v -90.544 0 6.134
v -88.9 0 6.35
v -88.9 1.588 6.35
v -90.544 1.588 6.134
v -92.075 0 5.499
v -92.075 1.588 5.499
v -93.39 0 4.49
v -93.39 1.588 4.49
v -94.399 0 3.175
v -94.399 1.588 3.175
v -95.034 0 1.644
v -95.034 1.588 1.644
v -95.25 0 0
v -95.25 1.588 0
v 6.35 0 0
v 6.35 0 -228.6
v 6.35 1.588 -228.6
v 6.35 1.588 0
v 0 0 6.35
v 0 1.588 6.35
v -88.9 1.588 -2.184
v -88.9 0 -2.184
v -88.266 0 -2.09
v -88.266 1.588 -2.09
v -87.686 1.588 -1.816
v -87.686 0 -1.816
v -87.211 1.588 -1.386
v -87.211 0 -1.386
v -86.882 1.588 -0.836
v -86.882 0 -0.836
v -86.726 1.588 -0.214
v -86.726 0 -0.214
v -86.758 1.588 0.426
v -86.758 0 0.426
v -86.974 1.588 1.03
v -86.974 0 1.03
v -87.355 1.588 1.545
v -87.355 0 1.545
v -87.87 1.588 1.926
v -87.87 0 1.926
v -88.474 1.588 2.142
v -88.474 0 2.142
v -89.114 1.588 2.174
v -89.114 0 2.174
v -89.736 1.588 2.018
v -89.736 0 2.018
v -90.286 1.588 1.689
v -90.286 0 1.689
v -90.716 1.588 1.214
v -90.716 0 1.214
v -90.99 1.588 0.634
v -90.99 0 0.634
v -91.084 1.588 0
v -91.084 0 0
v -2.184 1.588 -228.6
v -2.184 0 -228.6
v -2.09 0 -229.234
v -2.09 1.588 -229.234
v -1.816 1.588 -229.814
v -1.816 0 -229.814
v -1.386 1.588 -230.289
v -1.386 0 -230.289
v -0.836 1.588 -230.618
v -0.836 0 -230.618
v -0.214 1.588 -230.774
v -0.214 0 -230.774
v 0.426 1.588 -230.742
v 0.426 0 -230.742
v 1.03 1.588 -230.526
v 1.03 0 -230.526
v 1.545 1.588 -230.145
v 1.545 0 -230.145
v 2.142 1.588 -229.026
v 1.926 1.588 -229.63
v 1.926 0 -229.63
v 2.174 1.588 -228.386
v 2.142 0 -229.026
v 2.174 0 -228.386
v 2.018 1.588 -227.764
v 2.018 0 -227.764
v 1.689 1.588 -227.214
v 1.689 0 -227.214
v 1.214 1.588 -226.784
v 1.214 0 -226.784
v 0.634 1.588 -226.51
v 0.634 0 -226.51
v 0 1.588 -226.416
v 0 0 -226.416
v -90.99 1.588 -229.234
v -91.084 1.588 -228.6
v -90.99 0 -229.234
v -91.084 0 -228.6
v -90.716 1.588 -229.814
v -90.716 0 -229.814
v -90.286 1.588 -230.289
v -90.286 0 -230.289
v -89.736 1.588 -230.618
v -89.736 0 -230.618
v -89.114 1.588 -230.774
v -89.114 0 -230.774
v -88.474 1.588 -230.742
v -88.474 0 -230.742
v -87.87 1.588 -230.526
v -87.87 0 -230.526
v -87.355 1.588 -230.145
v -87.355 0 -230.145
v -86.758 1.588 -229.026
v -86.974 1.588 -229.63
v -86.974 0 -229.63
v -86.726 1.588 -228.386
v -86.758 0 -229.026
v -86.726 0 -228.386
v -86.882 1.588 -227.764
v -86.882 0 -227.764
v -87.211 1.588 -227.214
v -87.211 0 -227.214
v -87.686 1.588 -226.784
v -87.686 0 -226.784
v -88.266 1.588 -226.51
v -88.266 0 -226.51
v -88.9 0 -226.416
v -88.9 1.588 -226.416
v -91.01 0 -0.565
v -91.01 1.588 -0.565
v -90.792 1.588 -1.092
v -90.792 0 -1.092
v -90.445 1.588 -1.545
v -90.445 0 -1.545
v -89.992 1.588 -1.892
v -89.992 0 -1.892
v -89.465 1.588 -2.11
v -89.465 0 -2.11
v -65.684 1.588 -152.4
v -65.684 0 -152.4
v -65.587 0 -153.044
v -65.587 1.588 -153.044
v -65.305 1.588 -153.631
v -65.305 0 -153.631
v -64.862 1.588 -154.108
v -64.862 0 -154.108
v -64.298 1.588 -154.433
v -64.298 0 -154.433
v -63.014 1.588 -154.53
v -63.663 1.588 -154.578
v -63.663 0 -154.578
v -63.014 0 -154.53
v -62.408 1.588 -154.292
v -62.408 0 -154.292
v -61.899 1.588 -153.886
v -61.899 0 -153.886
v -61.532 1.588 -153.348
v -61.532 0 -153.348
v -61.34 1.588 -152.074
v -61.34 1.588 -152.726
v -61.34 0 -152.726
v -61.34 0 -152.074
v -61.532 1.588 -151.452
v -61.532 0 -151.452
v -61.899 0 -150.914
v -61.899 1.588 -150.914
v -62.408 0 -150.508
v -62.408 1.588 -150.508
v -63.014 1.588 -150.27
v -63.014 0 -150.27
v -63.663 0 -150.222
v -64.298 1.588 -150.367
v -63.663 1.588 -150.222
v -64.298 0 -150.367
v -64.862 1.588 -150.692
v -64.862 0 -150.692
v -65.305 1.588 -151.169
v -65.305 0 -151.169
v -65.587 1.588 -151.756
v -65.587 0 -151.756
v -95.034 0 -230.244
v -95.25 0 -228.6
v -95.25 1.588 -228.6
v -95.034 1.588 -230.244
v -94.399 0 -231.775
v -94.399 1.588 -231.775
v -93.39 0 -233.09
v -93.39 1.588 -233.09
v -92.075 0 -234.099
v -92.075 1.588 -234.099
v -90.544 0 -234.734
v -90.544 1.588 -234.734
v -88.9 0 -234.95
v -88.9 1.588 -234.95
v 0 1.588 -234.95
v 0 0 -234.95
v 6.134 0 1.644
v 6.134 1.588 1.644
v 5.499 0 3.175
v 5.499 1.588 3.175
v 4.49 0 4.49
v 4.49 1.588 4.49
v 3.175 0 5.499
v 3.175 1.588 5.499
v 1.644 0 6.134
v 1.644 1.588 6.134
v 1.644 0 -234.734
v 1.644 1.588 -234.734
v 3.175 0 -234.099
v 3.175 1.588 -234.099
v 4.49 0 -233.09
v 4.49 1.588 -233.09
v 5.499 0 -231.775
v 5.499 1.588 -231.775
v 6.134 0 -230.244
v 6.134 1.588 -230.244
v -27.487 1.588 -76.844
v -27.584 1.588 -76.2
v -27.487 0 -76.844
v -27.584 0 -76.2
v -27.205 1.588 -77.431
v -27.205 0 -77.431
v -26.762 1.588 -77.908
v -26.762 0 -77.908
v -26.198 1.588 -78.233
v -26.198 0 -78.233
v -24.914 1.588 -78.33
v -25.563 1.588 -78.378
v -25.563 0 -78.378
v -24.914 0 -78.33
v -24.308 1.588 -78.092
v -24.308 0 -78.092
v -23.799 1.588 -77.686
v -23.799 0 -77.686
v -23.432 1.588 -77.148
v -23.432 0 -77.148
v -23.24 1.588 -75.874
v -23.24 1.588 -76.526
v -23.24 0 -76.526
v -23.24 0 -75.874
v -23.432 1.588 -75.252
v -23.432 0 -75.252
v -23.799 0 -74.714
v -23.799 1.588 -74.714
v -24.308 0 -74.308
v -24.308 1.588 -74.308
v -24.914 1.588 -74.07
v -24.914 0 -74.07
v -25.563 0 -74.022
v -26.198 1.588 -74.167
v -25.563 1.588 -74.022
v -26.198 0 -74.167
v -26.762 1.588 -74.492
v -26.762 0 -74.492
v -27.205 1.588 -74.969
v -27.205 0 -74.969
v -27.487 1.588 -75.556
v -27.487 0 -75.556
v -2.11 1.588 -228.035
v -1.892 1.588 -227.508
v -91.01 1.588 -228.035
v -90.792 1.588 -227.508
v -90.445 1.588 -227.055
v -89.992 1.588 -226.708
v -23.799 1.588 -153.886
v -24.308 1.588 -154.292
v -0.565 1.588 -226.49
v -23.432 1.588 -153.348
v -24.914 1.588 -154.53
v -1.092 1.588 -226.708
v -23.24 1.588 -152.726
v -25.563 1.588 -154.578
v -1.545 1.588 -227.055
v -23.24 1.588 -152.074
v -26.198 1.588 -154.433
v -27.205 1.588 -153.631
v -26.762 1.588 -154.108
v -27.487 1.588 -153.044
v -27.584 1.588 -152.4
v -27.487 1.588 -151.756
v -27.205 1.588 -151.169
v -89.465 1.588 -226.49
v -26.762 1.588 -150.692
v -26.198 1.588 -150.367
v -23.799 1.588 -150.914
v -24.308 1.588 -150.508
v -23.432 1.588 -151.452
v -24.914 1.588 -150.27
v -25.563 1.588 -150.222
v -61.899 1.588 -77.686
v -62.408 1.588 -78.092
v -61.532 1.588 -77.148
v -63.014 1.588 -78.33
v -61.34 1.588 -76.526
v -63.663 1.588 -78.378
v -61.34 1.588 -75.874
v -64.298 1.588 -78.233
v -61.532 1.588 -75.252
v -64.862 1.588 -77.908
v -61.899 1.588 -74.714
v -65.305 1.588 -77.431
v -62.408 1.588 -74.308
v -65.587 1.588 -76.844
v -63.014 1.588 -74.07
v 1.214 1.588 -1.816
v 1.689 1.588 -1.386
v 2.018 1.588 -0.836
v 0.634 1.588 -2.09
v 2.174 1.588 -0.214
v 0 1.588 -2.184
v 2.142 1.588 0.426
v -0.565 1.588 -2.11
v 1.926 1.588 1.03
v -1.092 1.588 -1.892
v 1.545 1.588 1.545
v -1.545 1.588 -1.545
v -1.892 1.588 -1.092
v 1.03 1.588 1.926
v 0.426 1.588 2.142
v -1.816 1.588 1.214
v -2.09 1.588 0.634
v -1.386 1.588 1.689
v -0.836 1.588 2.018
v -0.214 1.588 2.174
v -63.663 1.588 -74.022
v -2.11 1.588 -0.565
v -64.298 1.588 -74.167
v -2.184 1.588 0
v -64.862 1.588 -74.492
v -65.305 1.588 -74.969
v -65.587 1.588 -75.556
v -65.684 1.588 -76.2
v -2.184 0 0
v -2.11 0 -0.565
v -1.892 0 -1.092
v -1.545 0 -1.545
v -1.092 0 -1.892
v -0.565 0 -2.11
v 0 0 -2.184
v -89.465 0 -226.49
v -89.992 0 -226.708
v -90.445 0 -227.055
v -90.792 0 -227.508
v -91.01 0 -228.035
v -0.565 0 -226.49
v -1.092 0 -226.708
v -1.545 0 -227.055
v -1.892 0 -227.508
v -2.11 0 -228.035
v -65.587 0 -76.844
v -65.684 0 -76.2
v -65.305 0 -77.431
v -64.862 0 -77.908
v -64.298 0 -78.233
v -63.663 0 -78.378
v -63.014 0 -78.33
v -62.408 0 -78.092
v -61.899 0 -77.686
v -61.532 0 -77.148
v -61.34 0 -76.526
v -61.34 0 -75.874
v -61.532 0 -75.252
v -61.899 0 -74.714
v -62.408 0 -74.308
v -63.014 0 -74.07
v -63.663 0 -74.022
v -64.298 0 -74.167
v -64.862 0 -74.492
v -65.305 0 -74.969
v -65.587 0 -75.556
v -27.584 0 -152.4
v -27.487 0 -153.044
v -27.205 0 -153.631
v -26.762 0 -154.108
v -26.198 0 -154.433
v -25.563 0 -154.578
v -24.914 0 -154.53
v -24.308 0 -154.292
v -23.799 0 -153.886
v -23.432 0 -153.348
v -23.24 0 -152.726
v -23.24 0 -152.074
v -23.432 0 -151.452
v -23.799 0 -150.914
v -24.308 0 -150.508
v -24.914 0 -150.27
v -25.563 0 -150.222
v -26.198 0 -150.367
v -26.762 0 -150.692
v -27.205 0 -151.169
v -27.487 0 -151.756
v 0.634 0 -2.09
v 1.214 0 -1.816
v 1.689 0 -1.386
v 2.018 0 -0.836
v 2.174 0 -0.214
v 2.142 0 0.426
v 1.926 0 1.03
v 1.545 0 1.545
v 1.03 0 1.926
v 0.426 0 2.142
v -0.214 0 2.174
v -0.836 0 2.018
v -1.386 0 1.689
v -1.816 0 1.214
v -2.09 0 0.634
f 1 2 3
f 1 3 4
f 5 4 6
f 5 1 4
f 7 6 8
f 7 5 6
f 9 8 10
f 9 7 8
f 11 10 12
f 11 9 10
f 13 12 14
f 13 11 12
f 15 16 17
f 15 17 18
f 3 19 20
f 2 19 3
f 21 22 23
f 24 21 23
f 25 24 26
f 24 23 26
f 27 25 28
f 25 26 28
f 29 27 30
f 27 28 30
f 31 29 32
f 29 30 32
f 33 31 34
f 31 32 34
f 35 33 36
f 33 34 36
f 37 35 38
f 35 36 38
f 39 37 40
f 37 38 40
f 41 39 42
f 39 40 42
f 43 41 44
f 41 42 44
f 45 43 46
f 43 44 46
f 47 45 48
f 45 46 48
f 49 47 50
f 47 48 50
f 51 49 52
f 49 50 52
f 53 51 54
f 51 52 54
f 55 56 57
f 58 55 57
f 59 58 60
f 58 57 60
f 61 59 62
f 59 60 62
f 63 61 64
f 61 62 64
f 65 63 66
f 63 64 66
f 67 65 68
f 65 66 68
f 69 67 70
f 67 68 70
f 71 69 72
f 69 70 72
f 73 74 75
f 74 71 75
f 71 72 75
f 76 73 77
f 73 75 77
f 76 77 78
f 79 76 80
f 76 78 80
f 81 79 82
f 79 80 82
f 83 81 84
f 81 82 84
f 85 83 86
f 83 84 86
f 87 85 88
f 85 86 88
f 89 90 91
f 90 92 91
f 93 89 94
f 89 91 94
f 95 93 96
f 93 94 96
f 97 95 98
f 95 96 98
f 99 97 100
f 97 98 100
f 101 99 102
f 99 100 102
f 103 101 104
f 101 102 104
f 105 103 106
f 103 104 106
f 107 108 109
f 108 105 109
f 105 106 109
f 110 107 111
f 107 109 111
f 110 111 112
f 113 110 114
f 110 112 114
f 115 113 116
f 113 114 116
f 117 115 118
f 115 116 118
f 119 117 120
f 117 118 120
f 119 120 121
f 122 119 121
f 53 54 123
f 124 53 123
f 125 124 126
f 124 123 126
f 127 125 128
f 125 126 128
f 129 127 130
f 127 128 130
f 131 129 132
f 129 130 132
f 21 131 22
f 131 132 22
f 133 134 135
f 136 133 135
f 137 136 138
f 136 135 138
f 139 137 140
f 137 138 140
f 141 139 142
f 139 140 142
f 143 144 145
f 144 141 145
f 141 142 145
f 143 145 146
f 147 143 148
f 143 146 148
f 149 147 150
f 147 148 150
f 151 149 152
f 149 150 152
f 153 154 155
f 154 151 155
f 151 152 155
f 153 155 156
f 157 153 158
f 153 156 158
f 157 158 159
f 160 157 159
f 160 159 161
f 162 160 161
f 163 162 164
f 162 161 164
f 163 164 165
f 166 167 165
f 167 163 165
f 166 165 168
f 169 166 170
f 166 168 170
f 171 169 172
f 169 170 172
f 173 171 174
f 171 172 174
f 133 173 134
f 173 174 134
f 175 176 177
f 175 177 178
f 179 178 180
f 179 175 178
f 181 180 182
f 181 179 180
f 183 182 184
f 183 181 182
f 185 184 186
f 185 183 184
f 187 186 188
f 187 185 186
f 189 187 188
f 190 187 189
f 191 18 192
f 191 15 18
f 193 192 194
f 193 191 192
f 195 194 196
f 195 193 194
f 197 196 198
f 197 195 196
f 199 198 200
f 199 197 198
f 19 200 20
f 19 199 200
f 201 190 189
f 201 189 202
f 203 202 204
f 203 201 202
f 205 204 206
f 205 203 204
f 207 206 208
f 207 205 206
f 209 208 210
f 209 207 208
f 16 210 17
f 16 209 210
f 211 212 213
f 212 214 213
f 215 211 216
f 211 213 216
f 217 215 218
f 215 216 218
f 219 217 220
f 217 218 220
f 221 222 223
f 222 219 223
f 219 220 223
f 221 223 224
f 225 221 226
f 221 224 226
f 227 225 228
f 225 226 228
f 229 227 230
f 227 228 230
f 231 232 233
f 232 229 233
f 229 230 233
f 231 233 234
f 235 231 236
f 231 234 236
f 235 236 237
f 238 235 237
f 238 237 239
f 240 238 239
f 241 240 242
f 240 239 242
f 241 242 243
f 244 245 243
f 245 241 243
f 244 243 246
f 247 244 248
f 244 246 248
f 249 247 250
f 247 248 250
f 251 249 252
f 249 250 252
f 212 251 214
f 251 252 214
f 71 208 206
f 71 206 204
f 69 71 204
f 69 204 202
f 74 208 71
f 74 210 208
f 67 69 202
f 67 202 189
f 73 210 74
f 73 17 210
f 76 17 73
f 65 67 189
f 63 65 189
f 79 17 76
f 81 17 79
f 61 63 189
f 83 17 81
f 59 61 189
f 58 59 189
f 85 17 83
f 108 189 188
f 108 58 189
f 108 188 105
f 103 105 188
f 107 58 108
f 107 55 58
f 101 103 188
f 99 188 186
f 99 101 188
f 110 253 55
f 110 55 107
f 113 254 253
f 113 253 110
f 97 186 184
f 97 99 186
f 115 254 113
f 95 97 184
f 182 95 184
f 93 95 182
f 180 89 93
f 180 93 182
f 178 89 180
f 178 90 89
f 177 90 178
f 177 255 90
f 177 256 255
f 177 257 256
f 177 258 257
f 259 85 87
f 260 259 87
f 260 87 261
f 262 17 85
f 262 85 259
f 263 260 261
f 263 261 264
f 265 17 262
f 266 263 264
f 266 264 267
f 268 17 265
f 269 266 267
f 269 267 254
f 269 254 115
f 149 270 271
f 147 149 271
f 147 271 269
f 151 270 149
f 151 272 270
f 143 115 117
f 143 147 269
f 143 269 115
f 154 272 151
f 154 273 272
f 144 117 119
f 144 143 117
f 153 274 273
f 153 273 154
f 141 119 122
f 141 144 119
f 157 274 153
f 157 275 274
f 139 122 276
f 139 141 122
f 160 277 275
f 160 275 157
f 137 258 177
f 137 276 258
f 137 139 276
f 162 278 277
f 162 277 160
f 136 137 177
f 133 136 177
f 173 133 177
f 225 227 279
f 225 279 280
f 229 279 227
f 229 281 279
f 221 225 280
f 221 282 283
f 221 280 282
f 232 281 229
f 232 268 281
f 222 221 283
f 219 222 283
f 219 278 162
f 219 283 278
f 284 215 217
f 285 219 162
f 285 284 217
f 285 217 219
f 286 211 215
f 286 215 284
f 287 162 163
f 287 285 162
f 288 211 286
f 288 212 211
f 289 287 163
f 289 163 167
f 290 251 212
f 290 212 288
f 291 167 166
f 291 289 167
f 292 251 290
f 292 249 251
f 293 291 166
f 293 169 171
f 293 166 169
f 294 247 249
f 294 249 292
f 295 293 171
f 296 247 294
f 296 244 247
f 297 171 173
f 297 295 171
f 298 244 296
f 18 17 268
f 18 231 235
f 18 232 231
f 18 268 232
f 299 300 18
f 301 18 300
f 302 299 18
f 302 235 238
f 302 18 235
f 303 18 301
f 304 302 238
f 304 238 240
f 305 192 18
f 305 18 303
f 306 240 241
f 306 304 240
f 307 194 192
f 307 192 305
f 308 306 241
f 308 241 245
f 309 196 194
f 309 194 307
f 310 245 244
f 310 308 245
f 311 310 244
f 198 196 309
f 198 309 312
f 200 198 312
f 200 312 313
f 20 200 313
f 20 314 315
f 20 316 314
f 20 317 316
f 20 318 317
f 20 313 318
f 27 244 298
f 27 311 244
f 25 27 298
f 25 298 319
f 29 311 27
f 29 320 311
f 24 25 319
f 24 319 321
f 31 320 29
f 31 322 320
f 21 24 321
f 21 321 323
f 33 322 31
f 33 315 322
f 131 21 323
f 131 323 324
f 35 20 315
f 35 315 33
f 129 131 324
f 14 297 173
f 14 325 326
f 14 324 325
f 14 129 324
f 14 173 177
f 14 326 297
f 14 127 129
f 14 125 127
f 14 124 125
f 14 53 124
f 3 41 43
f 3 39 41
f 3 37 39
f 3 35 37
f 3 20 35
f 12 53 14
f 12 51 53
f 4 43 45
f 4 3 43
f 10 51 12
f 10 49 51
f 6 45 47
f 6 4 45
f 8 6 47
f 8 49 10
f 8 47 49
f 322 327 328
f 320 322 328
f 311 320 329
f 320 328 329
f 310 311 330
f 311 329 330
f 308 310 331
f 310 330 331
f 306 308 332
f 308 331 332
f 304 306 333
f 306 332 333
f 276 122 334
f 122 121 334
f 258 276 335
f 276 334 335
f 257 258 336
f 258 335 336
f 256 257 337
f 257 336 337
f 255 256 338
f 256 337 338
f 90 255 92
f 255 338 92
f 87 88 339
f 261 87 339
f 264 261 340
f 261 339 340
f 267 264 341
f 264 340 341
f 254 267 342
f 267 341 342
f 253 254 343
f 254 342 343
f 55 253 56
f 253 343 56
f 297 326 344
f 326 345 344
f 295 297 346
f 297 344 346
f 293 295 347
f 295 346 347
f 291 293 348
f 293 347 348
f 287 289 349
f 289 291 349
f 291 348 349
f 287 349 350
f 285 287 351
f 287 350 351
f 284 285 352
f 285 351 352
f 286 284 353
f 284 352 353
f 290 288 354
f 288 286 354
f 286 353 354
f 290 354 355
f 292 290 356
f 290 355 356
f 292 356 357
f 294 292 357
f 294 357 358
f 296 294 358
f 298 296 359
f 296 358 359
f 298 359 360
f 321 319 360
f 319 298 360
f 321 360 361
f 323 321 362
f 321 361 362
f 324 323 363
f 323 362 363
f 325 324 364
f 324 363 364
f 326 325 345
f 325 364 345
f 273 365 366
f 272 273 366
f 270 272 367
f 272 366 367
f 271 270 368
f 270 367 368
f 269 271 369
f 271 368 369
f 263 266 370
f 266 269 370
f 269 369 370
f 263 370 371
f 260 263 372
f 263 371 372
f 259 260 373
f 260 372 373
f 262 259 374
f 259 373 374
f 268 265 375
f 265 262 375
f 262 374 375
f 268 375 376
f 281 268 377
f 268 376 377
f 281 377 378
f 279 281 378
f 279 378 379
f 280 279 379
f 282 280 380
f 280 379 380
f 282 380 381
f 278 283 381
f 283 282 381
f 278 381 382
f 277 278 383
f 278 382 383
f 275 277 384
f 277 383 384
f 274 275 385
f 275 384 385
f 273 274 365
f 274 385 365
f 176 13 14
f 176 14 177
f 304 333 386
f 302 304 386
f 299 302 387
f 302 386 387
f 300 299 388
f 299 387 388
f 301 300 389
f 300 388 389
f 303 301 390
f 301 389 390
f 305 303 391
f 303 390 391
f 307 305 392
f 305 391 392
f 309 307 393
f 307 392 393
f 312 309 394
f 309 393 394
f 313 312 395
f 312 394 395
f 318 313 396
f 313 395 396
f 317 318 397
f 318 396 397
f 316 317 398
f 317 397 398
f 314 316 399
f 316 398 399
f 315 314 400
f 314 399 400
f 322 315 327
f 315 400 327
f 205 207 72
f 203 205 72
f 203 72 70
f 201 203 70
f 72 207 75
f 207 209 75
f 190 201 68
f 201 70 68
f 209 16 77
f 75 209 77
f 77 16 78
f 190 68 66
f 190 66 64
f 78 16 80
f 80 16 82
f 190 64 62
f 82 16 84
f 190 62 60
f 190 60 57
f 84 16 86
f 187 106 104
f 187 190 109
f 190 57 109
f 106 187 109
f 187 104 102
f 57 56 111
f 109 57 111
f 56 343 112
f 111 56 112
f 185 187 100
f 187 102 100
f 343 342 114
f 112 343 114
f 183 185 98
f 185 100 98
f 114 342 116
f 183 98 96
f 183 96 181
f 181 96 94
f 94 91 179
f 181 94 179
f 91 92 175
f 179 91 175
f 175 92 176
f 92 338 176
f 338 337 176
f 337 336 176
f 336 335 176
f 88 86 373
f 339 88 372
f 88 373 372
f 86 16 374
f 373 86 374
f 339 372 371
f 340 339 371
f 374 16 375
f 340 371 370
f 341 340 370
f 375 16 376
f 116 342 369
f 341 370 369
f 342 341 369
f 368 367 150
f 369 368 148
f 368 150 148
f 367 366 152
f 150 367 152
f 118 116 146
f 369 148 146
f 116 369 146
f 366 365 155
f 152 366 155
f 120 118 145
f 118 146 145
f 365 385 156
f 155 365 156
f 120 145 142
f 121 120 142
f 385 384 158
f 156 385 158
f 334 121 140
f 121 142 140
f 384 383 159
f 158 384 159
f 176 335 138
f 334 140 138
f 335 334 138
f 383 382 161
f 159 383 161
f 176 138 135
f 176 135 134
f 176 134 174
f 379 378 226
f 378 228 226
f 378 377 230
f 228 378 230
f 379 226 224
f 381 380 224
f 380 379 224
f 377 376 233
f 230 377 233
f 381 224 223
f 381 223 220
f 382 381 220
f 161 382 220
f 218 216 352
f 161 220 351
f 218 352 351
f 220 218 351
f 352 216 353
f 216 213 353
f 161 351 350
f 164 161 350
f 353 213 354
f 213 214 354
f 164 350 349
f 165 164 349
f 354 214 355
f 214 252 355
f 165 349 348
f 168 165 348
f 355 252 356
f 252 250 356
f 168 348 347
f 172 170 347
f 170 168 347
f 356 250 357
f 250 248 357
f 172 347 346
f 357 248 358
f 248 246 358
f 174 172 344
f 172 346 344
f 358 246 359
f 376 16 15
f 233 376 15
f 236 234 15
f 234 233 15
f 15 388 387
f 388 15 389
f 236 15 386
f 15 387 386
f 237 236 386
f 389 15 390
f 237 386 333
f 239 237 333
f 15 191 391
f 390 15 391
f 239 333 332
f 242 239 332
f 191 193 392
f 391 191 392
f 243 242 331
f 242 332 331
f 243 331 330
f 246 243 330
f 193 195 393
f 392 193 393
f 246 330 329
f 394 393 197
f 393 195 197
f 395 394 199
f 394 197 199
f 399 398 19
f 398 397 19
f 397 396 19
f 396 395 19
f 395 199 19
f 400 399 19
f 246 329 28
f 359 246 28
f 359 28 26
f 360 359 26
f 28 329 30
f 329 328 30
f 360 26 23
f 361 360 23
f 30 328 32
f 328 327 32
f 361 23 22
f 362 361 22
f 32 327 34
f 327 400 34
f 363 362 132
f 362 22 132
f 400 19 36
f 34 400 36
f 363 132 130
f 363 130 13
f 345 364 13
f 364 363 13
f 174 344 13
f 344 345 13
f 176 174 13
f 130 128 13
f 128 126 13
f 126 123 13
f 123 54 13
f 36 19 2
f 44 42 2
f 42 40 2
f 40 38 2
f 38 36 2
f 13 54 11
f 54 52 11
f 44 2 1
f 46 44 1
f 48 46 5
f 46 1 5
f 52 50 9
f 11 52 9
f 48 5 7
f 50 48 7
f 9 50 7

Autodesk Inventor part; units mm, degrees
ref_plane "YZ Plane" through (0, 0, 0) normal (1, 0, 0) x (0, 1, 0)
ref_plane "XZ Plane" through (0, 0, 0) normal (0, 1, 0) x (-1, 0, 0)
ref_plane "XY Plane" through (0, 0, 0) normal (0, 0, 1) x (1, 0, 0)
sketch "Sketch1" plane through (0, 0, 0) normal (0, 1, 0) x (-1, 0, 0)
  circle A0 centre (0, 0) radius 2.1844
  circle A1 centre (0, -228.6) radius 2.1844
  circle A2 centre (88.9, 0) radius 2.1844
  circle A3 centre (88.9, -228.6) radius 2.1844
  circle A4 centre (63.5, -76.2) radius 2.1844
  circle A5 centre (63.5, -152.4) radius 2.1844
  circle A6 centre (25.4, -152.4) radius 2.1844
  circle A7 centre (25.4, -76.2) radius 2.1844
  line L0 (95.25, 0) -> (95.25, -228.6)
  line L1 (88.9, -234.95) -> (0, -234.95)
  line L2 (-6.35, -228.6) -> (-6.35, 0)
  line L3 (0, 6.35) -> (88.9, 6.35)
  arc A8 (95.25, 0) -> (88.9, 6.35) centre (88.9, 0) ccw
  arc A9 (88.9, -234.95) -> (95.25, -228.6) centre (88.9, -228.6) ccw
  arc A10 (-6.35, -228.6) -> (0, -234.95) centre (0, -228.6) ccw
  arc A11 (0, 6.35) -> (-6.35, 0) centre (0, 0) ccw
  line L4 (88.9, 0) -> (88.9, -228.6)
  line L5 (0, 0) -> (0, -228.6)
  point P0 (44.45, -114.3)
  point P1 (44.45, -114.3)
  dimension "d0" = 4.3688
  dimension "d2" = 4.3688
  dimension "d7" = 4.3688
  dimension "d8" = 4.3688
  dimension "d15" = 4.3688
  dimension "d16" = 4.3688
  dimension "d17" = 4.3688
  dimension "d18" = 4.3688
extrude "Extrusion1" add sketch "Sketch1" along normal blind 1.5875
properties part number "brainmount(pocketlater)"
